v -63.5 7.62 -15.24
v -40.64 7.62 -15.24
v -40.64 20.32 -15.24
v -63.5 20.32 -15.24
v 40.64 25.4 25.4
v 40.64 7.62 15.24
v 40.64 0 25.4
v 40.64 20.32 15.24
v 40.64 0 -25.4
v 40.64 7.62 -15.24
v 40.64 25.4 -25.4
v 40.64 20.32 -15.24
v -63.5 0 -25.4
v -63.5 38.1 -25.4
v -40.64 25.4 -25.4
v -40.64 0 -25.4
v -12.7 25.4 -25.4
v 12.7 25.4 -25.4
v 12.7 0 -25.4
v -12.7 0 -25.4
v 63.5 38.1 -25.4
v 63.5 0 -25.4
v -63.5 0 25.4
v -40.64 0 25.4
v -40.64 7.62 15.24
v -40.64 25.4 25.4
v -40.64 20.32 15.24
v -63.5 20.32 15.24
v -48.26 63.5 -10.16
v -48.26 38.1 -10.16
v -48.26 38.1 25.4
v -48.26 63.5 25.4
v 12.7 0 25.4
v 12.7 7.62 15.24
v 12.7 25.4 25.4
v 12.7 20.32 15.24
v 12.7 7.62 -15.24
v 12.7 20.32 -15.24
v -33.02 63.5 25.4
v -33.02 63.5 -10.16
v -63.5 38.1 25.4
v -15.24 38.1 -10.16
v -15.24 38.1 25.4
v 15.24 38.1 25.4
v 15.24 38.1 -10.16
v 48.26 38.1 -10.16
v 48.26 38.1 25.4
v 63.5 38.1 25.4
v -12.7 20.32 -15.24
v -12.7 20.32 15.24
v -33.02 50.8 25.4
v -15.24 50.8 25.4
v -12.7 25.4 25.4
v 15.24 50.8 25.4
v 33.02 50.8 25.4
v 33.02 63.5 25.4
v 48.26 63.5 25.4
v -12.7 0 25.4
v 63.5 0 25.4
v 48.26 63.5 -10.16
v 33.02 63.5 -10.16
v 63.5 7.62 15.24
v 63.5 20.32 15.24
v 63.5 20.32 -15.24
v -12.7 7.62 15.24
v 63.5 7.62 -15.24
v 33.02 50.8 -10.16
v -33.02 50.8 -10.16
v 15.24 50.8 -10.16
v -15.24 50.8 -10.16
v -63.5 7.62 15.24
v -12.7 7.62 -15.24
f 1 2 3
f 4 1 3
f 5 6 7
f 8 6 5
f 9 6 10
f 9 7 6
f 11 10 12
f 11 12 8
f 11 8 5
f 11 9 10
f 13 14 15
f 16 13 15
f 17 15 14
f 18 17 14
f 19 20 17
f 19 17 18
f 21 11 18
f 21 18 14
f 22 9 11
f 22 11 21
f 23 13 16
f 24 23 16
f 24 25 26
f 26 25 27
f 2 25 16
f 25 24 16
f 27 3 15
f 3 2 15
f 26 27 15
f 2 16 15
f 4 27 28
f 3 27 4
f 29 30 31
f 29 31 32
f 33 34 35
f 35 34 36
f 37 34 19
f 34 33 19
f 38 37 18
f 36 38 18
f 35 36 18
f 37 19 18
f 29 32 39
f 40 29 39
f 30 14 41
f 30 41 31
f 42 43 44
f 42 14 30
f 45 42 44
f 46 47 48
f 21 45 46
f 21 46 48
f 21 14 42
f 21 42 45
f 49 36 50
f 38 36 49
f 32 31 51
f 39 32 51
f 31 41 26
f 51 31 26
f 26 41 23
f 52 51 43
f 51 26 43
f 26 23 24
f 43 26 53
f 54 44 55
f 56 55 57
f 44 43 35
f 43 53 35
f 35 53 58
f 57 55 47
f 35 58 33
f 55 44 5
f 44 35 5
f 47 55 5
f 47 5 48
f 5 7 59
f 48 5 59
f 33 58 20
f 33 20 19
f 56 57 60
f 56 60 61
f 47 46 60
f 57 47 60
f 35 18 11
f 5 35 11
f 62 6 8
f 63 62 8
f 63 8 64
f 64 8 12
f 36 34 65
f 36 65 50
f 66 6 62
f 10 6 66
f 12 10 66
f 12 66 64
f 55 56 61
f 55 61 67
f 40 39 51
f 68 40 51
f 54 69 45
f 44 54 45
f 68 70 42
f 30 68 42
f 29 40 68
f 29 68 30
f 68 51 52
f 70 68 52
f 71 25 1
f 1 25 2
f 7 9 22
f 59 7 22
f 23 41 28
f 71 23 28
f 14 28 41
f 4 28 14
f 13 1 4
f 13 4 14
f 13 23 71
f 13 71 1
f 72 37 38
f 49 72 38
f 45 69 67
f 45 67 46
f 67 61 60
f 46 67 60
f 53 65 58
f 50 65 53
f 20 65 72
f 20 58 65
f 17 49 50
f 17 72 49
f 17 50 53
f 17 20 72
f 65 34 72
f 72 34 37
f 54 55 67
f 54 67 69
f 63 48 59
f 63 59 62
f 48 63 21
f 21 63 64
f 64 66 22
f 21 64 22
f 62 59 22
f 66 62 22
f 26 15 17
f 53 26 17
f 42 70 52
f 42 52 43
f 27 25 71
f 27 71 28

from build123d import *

# Parameters (mm, degrees)
SKETCH2_W               = 127
SKETCH2_H               = 50.8
BOSS_EXTRUDE1_DEPTH     = 38.1
SKETCH4_W               = 27.94
SKETCH4_H               = 25.4
CUT_EXTRUDE1_DEPTH      = 26.4
CUT_EXTRUDE1_DEPTH_BACK = 26.4
SKETCH5_W               = 30.48
SKETCH5_H               = 12.7
CUT_EXTRUDE2_DEPTH      = 64.5
CUT_EXTRUDE2_DEPTH_BACK = 64.5
BOSS_EXTRUDE2_START     = -50.8
BOSS_EXTRUDE2_DEPTH     = 35.56


with BuildPart() as part:
    # Sketch2 → Boss-Extrude1 (new body)
    with BuildSketch(Plane(origin=(0, 0, 0), x_dir=(1, 0, 0), z_dir=(0, 1, 0))):
        Rectangle(SKETCH2_W, SKETCH2_H)
    extrude(amount=BOSS_EXTRUDE1_DEPTH)

    # Sketch4 → Cut-Extrude1 (cut, two sides)
    with BuildSketch(Plane.XY) as cut_extrude1_sk:
        with Locations((-26.67, 12.7)):
            Rectangle(SKETCH4_W, SKETCH4_H)
        with Locations((26.67, 12.7)):
            Rectangle(SKETCH4_W, SKETCH4_H)
    extrude(amount=CUT_EXTRUDE1_DEPTH, mode=Mode.SUBTRACT)
    extrude(cut_extrude1_sk.sketch, amount=-CUT_EXTRUDE1_DEPTH_BACK, mode=Mode.SUBTRACT)

    # Sketch5 → Cut-Extrude2 (cut, two sides)
    with BuildSketch(Plane(origin=(0, 0, 0), x_dir=(0, 0, -1), z_dir=(1, 0, 0))) as cut_extrude2_sk:
        with Locations((0, 13.97)):
            Rectangle(SKETCH5_W, SKETCH5_H)
    extrude(amount=CUT_EXTRUDE2_DEPTH, mode=Mode.SUBTRACT)
    extrude(cut_extrude2_sk.sketch, amount=-CUT_EXTRUDE2_DEPTH_BACK, mode=Mode.SUBTRACT)

    # Sketch7 → Boss-Extrude2 (add)
    with BuildSketch(Plane(origin=(0, 0, -25.4), x_dir=(-1, 0, 0), z_dir=(0, 0, -1)).offset(BOSS_EXTRUDE2_START)):
        Polygon((48.26, 38.1), (48.26, 63.5), (33.02, 63.5), (33.02, 50.8), (15.24, 50.8), (15.24, 38.1), align=None)
        Polygon((-15.24, 38.1), (-48.26, 38.1), (-48.26, 63.5), (-33.02, 63.5), (-33.02, 50.8), (-15.24, 50.8), align=None)
    extrude(amount=BOSS_EXTRUDE2_DEPTH)


solid = part.part
